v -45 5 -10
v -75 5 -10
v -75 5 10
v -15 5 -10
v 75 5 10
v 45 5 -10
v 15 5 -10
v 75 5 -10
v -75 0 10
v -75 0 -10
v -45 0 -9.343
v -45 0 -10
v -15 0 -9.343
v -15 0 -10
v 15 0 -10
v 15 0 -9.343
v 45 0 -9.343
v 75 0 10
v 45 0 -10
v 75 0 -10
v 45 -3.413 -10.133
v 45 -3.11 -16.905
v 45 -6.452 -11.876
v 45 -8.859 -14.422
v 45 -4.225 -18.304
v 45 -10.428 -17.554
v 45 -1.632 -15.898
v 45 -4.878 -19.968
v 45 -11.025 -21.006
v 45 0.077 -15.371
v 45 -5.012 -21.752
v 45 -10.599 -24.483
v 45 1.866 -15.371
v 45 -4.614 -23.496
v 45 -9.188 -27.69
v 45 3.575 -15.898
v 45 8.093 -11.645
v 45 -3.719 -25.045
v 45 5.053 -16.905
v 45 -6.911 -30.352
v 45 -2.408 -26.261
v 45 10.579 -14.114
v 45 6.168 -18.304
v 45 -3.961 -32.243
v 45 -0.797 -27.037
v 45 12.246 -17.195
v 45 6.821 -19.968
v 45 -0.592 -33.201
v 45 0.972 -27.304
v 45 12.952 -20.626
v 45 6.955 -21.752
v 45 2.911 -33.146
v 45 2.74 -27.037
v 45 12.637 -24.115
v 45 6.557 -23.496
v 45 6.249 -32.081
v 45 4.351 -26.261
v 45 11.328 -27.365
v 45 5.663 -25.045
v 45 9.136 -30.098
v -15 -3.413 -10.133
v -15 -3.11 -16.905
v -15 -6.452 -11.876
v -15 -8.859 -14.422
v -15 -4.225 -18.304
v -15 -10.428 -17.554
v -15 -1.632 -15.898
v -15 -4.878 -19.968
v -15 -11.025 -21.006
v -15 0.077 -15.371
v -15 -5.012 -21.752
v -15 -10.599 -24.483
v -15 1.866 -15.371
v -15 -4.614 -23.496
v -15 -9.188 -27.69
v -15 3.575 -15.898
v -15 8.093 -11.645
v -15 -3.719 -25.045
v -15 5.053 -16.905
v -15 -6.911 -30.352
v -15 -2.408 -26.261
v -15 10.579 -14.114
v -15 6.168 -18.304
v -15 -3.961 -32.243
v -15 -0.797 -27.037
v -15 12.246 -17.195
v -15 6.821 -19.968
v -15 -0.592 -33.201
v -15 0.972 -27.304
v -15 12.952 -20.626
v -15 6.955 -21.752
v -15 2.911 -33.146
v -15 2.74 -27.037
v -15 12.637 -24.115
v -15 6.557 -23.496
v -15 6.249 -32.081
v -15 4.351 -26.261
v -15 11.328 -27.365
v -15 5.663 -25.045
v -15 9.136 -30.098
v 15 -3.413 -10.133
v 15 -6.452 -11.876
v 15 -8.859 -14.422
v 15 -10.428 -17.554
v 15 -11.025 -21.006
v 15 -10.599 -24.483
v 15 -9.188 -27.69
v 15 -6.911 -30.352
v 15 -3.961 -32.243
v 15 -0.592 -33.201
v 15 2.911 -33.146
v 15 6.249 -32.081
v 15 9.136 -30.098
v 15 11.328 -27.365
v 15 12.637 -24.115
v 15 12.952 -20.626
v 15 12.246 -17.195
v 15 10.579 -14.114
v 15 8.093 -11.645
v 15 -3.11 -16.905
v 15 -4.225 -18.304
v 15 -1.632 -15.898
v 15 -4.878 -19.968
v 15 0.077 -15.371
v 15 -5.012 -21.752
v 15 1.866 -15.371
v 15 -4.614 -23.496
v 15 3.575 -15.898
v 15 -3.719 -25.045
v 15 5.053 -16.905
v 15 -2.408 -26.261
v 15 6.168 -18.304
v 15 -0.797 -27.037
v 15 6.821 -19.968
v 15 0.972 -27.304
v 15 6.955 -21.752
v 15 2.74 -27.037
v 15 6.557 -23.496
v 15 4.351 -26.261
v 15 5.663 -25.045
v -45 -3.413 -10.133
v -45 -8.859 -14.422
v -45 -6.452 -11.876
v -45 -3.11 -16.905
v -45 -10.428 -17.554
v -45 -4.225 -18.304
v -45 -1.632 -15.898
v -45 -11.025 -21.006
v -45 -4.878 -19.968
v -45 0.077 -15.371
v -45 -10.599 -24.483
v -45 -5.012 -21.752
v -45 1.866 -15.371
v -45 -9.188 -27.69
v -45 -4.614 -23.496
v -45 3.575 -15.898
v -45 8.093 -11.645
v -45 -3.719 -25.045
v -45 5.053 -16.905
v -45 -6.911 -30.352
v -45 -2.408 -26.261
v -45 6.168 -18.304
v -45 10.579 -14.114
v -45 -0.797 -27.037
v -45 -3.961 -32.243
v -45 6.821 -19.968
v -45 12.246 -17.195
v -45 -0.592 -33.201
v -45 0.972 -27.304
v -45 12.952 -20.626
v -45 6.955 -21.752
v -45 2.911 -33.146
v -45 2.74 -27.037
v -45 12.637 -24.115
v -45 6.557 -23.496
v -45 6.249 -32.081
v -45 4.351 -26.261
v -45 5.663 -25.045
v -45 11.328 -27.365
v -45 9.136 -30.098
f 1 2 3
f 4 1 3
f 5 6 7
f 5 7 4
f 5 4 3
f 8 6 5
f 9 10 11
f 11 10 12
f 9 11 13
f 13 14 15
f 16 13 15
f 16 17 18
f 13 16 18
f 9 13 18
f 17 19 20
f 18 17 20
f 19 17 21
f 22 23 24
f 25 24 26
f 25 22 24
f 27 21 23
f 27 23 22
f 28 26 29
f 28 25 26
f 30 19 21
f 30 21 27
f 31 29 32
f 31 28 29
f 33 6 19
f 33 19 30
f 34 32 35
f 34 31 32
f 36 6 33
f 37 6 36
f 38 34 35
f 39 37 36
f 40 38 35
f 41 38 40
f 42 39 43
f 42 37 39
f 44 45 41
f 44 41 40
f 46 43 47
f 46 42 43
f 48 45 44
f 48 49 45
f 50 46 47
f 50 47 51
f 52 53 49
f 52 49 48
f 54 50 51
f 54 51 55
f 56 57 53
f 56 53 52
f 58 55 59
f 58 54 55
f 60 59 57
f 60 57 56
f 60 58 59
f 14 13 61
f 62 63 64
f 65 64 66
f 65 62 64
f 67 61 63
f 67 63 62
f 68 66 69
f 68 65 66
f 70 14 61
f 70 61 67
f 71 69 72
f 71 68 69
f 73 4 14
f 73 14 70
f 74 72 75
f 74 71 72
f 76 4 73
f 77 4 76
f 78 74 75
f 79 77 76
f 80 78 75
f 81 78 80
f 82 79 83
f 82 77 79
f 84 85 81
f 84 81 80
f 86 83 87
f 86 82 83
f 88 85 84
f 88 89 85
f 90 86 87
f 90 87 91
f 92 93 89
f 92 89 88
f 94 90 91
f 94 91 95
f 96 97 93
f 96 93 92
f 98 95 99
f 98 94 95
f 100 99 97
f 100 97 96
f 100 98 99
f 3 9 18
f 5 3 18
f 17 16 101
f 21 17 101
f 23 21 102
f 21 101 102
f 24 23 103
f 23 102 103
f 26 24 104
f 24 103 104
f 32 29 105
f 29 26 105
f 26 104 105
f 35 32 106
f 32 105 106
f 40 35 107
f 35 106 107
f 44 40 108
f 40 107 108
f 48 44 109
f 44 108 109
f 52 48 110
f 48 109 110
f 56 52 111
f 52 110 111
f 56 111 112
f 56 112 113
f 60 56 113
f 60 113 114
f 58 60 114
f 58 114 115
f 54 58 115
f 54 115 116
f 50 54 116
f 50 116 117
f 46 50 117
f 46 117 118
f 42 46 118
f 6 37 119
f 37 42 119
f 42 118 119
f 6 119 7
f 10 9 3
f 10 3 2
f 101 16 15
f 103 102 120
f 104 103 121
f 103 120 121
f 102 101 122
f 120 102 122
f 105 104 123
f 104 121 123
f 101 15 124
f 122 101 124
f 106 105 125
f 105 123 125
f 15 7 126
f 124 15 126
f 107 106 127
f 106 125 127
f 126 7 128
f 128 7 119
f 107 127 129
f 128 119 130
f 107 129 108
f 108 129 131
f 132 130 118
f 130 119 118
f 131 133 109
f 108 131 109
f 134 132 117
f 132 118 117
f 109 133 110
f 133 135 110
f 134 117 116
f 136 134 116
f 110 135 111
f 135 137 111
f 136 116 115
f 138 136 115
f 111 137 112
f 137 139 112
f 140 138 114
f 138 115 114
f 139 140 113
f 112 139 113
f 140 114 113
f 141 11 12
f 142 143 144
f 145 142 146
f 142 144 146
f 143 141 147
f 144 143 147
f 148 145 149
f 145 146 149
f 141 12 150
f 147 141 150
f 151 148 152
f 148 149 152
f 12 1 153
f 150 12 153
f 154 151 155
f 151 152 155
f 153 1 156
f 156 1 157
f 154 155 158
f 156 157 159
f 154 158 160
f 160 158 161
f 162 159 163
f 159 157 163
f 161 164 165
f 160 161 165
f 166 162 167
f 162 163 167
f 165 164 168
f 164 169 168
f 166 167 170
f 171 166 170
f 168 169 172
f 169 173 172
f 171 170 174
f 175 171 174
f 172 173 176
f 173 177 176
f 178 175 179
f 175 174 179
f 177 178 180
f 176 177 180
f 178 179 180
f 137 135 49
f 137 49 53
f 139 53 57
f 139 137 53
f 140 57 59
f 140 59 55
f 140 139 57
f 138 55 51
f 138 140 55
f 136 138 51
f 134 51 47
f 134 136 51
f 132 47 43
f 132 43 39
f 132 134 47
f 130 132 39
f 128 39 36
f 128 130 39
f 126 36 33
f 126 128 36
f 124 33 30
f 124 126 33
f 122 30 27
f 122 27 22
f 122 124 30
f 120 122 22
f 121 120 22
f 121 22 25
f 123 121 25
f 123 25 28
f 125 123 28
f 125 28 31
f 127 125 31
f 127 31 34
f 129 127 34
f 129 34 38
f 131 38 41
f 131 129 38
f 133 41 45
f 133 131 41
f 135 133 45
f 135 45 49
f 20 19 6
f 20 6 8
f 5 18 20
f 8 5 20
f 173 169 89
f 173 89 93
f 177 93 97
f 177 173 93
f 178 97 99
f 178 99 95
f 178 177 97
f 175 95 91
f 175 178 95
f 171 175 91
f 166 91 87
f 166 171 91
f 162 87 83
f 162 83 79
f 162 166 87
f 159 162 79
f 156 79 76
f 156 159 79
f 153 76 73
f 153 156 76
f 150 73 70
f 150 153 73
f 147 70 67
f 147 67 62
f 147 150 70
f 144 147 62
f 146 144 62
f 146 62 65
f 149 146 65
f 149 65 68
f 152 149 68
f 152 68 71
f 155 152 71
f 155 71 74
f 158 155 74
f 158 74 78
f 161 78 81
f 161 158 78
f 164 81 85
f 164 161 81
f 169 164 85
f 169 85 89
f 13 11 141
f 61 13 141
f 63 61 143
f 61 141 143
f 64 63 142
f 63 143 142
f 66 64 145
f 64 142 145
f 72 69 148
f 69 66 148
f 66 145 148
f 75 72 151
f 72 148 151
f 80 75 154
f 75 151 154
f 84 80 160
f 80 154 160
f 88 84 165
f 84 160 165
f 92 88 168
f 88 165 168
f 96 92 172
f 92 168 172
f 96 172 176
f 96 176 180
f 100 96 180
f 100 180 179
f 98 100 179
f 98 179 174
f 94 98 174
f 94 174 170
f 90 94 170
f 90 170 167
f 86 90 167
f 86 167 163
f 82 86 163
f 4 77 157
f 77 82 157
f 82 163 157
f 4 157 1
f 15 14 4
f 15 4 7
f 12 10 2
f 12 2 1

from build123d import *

# Parameters (mm, degrees)
SKETCH1_W           = 150
SKETCH1_H           = 20
BOSS_EXTRUDE1_DEPTH = 5
BOSS_EXTRUDE2_START = -60
SKETCH2_R           = 12
SKETCH2_R_2         = 6
BOSS_EXTRUDE2_DEPTH = 30
LPATTERN1_COUNT     = 2
LPATTERN1_PITCH     = 60


with BuildPart() as part:
    # Sketch1 → Boss-Extrude1 (new body)
    with BuildSketch(Plane(origin=(0, 0, 0), x_dir=(1, 0, 0), z_dir=(0, 1, 0))):
        Rectangle(SKETCH1_W, SKETCH1_H)
    extrude(amount=BOSS_EXTRUDE1_DEPTH)

    # Sketch2 → Boss-Extrude2 (add)
    with BuildSketch(Plane(origin=(75, 0, 0), x_dir=(0, 0, -1), z_dir=(1, 0, 0)).offset(BOSS_EXTRUDE2_START)):
        with Locations((21.303604064, 0.97153439)):
            Circle(SKETCH2_R)
        with Locations((21.303604064, 0.97153439)):
            Circle(SKETCH2_R_2, mode=Mode.SUBTRACT)
    boss_extrude2 = extrude(amount=BOSS_EXTRUDE2_DEPTH)

    # LPattern1: Boss-Extrude2 ×2
    with Locations(*[(-i * LPATTERN1_PITCH, 0, 0) for i in range(1, LPATTERN1_COUNT)]):
        add(boss_extrude2)


solid = part.part
